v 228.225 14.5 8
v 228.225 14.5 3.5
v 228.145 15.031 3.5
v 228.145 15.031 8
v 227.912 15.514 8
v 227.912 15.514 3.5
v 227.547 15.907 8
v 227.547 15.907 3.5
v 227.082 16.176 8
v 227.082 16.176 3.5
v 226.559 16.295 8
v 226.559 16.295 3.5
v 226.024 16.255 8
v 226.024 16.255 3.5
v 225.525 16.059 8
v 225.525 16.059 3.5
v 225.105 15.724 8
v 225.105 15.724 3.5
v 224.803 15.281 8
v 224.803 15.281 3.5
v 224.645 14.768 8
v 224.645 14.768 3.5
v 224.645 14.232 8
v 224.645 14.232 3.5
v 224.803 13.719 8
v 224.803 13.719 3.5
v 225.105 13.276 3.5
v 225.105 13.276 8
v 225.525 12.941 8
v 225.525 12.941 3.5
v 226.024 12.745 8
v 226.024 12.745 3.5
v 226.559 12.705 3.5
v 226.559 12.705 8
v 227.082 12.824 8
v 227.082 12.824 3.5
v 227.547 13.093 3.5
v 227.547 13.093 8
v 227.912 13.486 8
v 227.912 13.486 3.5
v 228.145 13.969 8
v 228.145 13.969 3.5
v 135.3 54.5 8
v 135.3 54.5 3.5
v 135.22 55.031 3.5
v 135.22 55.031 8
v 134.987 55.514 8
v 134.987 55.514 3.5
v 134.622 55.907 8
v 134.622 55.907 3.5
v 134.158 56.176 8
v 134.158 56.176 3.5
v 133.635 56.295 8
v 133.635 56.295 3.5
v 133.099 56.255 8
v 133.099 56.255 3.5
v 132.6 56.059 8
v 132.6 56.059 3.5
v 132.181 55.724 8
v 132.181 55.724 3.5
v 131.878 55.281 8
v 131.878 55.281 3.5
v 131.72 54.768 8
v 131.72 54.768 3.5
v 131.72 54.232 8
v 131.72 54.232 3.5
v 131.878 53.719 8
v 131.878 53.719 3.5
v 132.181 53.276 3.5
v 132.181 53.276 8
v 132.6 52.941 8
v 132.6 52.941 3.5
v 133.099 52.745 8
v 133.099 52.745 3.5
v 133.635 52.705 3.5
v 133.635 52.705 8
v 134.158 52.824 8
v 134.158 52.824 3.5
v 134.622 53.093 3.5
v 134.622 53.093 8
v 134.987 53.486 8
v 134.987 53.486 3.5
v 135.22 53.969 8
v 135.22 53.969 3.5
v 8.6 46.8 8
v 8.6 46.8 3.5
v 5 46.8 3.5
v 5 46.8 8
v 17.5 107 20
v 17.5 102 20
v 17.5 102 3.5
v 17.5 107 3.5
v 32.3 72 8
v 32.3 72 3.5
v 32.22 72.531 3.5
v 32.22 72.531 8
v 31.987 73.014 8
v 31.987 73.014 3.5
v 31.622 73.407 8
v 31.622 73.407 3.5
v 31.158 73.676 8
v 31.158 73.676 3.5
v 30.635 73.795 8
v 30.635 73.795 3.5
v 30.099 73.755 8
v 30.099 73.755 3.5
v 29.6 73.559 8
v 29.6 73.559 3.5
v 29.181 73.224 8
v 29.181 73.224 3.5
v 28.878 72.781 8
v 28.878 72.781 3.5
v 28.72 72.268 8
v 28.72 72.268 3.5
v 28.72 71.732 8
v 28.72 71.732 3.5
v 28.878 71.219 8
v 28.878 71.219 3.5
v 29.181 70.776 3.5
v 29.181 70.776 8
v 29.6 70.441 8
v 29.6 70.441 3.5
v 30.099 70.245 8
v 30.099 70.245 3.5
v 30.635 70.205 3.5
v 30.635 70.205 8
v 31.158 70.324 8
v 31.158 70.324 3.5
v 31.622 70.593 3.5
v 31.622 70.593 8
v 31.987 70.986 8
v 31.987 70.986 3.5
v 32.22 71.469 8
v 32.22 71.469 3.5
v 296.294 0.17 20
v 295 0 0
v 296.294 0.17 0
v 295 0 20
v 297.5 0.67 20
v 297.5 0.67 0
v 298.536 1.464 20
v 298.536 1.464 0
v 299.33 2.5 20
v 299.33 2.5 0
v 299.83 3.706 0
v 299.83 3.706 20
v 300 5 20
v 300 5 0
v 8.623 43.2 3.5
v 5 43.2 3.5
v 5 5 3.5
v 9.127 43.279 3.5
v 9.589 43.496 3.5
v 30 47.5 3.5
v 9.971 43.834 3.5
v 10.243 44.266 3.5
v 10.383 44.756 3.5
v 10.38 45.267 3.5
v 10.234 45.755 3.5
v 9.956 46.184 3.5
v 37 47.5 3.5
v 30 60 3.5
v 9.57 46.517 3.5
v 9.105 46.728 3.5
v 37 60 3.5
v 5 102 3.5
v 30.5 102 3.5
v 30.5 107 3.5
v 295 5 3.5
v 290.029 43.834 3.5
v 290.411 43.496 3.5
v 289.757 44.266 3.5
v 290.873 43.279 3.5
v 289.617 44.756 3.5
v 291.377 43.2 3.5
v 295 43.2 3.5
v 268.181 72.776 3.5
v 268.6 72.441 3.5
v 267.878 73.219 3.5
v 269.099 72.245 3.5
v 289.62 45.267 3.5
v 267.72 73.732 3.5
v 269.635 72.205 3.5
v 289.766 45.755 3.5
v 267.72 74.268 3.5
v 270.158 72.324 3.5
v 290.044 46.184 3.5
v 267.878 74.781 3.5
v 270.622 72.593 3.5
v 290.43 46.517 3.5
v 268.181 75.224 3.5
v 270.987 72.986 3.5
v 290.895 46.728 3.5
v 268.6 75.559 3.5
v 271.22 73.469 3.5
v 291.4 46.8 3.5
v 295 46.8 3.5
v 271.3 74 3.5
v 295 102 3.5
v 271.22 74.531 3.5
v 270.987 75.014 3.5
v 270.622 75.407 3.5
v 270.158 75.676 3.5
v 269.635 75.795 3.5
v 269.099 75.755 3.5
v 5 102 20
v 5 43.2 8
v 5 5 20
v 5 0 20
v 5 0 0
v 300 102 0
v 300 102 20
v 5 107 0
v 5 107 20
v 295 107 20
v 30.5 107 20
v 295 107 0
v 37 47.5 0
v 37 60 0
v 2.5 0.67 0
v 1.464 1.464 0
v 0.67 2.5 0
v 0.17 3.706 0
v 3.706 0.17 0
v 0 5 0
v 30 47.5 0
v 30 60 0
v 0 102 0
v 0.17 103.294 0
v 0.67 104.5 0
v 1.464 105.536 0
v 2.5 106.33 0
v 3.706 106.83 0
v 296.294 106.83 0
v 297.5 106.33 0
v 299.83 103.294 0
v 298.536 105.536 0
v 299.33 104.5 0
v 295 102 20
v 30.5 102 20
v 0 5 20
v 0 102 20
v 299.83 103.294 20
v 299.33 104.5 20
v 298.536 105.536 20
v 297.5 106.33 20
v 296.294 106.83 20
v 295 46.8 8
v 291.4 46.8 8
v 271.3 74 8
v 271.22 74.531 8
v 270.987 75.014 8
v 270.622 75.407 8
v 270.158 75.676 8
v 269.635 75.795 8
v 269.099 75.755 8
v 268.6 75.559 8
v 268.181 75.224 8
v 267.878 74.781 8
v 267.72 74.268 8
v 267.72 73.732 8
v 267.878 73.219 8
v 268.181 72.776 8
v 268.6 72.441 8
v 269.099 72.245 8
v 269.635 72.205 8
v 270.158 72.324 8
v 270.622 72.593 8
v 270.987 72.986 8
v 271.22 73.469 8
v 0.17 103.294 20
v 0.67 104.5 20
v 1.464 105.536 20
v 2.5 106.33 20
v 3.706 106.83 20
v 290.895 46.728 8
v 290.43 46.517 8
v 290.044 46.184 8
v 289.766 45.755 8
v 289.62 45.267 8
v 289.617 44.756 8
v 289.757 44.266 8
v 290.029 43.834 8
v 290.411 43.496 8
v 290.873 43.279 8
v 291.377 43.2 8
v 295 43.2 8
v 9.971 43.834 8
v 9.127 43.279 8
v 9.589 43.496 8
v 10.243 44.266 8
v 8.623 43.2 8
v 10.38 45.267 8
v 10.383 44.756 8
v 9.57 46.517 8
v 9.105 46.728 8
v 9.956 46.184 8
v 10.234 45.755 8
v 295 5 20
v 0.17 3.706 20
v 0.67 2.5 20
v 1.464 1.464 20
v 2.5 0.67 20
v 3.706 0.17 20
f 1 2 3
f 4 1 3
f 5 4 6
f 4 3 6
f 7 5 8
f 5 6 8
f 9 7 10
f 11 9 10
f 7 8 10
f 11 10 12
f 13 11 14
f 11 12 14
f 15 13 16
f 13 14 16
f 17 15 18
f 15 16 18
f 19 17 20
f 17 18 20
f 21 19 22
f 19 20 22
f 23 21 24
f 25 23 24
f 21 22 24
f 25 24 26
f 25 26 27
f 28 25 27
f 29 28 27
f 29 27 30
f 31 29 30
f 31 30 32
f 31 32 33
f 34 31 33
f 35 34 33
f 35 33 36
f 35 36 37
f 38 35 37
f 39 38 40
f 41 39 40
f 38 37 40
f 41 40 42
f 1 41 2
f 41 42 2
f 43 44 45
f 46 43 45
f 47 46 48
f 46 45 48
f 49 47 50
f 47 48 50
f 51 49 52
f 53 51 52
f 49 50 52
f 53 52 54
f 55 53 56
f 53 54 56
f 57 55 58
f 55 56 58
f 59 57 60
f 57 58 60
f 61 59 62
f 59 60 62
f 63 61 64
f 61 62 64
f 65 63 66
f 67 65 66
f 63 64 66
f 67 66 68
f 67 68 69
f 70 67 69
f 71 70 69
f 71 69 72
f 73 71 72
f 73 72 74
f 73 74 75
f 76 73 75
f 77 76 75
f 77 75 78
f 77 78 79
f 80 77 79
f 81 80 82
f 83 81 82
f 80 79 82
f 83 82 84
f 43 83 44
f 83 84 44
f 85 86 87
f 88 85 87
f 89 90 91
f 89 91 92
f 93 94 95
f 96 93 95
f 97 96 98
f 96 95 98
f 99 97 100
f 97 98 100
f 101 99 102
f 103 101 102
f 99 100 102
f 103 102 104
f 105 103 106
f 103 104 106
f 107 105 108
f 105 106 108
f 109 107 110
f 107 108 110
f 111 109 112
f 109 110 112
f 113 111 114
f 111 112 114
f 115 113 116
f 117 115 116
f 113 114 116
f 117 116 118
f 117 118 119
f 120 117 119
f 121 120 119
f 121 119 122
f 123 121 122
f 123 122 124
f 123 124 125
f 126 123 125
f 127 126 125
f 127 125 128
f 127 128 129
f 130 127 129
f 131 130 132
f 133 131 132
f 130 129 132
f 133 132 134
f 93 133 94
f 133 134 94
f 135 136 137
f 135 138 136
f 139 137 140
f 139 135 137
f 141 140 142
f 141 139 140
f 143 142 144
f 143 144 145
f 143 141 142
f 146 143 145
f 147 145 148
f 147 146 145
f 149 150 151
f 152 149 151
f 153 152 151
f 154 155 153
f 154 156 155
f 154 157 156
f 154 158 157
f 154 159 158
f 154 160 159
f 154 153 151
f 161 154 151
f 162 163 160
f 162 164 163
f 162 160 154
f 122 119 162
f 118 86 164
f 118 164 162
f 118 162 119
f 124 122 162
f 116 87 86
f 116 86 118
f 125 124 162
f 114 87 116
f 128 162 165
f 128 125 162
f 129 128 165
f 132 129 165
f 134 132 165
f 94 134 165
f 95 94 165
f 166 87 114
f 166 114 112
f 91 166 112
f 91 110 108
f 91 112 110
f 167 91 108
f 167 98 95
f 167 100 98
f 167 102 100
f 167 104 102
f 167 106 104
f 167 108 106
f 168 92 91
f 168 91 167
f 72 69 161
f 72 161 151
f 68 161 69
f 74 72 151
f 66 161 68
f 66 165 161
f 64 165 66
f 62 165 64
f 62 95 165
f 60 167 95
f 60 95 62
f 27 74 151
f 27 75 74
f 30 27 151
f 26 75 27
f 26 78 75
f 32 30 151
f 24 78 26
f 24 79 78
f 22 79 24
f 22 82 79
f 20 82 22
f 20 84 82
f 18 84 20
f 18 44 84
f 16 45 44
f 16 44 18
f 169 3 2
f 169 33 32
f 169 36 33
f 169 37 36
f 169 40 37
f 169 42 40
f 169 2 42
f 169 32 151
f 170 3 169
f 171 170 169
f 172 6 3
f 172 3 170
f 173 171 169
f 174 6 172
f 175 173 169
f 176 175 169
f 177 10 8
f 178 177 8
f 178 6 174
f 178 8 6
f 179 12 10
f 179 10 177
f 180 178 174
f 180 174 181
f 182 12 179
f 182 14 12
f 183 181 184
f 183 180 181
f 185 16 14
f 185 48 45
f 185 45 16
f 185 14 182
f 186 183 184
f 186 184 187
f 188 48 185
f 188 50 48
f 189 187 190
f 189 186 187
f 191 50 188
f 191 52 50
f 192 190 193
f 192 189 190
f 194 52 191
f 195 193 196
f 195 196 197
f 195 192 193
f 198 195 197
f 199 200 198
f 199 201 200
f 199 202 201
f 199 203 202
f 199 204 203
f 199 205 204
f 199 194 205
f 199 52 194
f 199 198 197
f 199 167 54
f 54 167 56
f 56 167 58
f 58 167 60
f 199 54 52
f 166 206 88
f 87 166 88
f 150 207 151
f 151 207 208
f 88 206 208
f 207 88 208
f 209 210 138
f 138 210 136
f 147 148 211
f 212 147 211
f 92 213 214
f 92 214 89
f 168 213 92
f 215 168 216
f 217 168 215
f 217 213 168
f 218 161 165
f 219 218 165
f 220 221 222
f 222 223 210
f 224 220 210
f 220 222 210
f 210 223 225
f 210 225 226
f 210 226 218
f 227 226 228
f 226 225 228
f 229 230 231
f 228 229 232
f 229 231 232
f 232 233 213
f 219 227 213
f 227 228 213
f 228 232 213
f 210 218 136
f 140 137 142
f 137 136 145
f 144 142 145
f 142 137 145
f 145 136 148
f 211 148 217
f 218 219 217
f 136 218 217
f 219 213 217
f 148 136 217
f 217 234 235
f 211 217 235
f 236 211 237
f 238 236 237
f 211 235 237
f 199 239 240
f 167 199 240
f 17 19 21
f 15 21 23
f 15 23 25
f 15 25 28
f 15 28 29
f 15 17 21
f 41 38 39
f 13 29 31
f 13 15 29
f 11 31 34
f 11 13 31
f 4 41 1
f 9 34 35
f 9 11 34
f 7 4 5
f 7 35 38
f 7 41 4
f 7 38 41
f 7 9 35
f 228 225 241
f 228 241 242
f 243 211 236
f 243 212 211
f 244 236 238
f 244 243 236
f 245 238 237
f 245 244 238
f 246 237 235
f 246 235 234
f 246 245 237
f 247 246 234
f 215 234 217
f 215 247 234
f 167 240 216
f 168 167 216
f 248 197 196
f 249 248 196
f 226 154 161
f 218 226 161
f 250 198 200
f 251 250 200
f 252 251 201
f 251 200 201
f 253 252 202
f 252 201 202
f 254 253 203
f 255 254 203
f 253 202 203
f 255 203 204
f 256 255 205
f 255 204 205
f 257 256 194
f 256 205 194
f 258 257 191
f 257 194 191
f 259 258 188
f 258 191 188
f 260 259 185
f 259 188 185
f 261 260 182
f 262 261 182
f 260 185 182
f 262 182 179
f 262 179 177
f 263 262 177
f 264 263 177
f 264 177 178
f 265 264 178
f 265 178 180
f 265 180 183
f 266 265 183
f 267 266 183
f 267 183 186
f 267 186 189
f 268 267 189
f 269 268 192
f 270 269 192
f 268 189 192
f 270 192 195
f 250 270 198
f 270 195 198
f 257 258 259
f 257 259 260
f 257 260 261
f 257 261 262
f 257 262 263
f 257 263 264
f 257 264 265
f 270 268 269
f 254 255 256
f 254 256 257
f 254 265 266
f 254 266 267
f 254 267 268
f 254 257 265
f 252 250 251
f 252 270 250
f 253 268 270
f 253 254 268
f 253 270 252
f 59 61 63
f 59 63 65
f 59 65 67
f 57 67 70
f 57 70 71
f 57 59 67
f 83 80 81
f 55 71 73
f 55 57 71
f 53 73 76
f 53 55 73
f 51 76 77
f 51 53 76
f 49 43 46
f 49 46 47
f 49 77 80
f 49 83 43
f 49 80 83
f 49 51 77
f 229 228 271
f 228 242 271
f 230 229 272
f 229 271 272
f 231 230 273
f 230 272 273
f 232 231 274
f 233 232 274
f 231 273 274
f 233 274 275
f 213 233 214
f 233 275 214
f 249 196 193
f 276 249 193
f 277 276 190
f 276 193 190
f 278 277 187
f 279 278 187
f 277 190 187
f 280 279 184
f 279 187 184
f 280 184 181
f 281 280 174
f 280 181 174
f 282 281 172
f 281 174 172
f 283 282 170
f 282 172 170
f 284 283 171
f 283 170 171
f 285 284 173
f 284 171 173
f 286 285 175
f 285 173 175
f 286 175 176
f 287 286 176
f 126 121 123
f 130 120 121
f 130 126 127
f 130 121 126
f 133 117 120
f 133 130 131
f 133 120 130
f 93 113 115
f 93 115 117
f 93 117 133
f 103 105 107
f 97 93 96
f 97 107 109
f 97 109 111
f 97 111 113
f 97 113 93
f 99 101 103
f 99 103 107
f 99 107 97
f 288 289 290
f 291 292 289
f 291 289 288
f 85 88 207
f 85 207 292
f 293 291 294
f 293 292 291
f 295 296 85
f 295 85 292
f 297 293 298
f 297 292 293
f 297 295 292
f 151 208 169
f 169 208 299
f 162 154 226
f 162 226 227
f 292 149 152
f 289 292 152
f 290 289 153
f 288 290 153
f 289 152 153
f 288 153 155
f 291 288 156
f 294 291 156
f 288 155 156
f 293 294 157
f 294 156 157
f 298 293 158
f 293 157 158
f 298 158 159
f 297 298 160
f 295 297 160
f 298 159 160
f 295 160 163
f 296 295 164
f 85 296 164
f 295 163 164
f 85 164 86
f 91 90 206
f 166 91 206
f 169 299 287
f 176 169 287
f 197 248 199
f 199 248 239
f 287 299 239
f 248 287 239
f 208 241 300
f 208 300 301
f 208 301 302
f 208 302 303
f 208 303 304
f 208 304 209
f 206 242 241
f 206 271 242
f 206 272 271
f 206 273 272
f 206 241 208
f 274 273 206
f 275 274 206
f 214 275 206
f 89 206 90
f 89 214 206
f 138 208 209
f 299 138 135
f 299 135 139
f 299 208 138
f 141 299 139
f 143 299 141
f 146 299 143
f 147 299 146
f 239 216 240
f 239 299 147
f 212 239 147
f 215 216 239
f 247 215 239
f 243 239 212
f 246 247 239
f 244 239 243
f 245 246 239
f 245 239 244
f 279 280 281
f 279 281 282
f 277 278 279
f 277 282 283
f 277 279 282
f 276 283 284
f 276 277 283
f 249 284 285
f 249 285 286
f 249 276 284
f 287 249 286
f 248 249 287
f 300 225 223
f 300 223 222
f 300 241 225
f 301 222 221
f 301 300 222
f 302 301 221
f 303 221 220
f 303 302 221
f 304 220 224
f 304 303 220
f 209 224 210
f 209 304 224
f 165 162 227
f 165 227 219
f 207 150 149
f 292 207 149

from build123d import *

# Parameters (mm, degrees)
F0_W     = 300
F0_H     = 107
F1_DEPTH = 20
F2_R     = 5
F3_W     = 13
F3_H     = 5
F4_DEPTH = 16.5
F5_R     = 1.8
F6_DEPTH = 4.5
F7_W     = 7
F7_H     = 12.5
F8_DEPTH = 25


with BuildPart() as f1:
    # F0 (on Top) → F1 (new body)
    with BuildSketch(Plane.XY):
        with Locations((150, 53.5)):
            Rectangle(F0_W, F0_H)
    extrude(amount=F1_DEPTH)

    # F2
    f2_edges = [f1.edges().sort_by_distance(p)[0] for p in [
        (0, 107, 10),
        (0, 0, 10),
        (300, 0, 10),
        (300, 107, 10),
    ]]
    fillet(f2_edges, radius=F2_R)

    # F3 (on face) + F1_face1 (on face) → F4 (cut)
    with BuildSketch(Plane.XY.offset(20)):
        Polygon((17.5, 102), (5, 102), (5, 5), (295, 5), (295, 102), (30.5, 102), align=None)
        with Locations((24, 104.5)):
            Rectangle(F3_W, F3_H)
    with BuildSketch(Plane(origin=(150, 53.5, 0), x_dir=(1, 0, 0), z_dir=(0, 0, -1))):
        with BuildLine():
            Line((-150, 48.5), (-150, -48.5))
            ThreePointArc((-150, -48.5), (-148.5355339059, -52.0355339059), (-145, -53.5))
            Line((-145, -53.5), (145, -53.5))
            ThreePointArc((145, -53.5), (148.5355339059, -52.0355339059), (150, -48.5))
            Line((150, -48.5), (150, 48.5))
            ThreePointArc((150, 48.5), (148.5355339059, 52.0355339059), (145, 53.5))
            Line((145, 53.5), (-145, 53.5))
            ThreePointArc((-145, 53.5), (-148.5355339059, 52.0355339059), (-150, 48.5))
        make_face()
    extrude(amount=-F4_DEPTH, dir=(0, 0, 1), mode=Mode.SUBTRACT)

    # F5 (on face) → F6 (join)
    with BuildSketch(Plane.XY.offset(3.5)):
        with Locations((269.5, 74)):
            Circle(F5_R)
        with Locations((226.4248728752, 14.5)):
            Circle(F5_R)
        with Locations((133.5, 54.5)):
            Circle(F5_R)
        with Locations((30.5, 72)):
            Circle(F5_R)
        with BuildLine():
            Line((8.6, 46.8000370503), (5, 46.8000370503))
            Line((5, 46.8000370503), (5, 43.2001111493))
            Line((5, 43.2001111493), (8.6230977842, 43.2001111493))
            ThreePointArc((8.6230977842, 43.2001111493), (10.4, 45.0115491298), (8.6, 46.8000370503))
        make_face()
        with BuildLine():
            Line((295, 43.2001111493), (295, 46.8000370503))
            Line((295, 46.8000370503), (291.4, 46.8000370503))
            ThreePointArc((291.4, 46.8000370503), (289.6, 45.0115491298), (291.3769022158, 43.2001111493))
            Line((291.3769022158, 43.2001111493), (295, 43.2001111493))
        make_face()
    extrude(amount=F6_DEPTH)

    # F7 (on face) → F8 (cut)
    with BuildSketch(Plane.XY.offset(3.5)):
        with Locations((33.5, 53.75)):
            Rectangle(F7_W, F7_H)
    extrude(amount=-F8_DEPTH, mode=Mode.SUBTRACT)


solid = f1.part
